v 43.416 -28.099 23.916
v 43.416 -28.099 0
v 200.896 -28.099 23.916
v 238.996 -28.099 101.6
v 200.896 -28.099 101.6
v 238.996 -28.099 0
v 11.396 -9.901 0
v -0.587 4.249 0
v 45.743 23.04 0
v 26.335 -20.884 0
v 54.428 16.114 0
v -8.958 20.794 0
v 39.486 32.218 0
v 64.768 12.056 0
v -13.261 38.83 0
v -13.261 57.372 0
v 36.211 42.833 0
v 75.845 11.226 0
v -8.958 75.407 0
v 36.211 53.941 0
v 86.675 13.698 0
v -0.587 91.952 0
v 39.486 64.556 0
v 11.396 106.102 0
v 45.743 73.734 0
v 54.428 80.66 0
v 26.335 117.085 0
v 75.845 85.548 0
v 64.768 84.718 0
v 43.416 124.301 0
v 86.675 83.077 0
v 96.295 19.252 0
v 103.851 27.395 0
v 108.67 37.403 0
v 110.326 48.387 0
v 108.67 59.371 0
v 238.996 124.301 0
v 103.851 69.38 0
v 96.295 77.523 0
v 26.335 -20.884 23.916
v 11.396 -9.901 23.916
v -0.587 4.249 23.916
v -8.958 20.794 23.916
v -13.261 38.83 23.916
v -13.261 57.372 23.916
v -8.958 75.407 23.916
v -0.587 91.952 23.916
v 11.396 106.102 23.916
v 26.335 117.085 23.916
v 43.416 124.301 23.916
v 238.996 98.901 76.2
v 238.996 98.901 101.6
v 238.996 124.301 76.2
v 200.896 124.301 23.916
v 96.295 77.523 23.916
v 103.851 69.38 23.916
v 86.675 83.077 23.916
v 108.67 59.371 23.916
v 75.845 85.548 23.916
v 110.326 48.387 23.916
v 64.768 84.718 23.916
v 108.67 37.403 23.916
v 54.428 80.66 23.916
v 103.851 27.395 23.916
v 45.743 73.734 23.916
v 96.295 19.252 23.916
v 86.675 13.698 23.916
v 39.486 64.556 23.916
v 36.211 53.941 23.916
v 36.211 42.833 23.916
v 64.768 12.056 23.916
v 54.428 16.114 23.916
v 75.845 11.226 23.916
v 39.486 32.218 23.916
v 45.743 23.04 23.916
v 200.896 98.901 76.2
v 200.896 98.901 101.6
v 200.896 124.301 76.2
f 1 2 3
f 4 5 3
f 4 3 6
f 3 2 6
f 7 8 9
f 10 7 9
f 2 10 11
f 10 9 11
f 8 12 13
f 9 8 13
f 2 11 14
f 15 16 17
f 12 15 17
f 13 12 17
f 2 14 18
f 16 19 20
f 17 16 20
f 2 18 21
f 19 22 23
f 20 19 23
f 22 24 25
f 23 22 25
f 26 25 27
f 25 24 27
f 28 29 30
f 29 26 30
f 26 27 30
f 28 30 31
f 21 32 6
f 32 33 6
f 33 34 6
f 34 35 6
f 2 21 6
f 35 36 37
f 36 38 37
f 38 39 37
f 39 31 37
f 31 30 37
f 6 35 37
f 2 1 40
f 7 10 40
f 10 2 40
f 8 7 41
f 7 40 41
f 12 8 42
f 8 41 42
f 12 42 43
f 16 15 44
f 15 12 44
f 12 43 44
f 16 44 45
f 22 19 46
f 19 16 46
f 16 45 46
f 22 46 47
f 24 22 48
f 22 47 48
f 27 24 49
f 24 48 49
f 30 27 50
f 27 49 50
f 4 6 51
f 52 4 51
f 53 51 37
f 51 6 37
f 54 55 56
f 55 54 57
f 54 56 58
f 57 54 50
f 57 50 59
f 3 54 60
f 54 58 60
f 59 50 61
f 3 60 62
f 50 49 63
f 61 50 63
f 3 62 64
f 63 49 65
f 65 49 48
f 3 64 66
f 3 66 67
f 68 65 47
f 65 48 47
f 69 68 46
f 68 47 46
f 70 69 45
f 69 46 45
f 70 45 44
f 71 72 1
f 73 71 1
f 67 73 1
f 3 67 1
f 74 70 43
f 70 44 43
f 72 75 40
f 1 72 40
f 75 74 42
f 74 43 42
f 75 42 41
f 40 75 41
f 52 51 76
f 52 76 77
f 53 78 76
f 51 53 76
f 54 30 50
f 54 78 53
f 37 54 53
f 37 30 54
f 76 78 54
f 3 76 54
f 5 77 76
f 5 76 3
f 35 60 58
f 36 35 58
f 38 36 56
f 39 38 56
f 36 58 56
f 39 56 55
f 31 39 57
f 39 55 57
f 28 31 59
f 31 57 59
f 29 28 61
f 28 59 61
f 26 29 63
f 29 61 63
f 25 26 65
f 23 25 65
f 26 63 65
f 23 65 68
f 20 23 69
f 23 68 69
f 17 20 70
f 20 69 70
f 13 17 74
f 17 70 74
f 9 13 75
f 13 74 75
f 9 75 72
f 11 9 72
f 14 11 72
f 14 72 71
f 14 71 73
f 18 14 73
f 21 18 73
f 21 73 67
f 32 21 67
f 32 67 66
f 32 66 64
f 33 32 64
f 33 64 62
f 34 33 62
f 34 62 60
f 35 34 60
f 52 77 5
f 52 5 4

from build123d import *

# Parameters (mm, degrees)
F0_W     = 254
F0_H     = 152.4
F1_DEPTH = 101.6
F2_W     = 152.4
F2_H     = 77.6838691145
F3_DEPTH = 215.9
F4_W     = 25.4
F4_H     = 25.4
F5_DEPTH = 50.8
F8_DEPTH = 25.4
F6_R     = 37.2654170077
F9_DEPTH = 25.4


with BuildPart() as f1:
    # F0 (on Top) → F1 (new body)
    with BuildSketch(Plane.XY):
        with Locations((111.9955861747, 48.1005767256)):
            Rectangle(F0_W, F0_H)
    extrude(amount=F1_DEPTH)

    # F2 (on face) → F3 (cut)
    with BuildSketch(Plane(origin=(-15.0044138253, 0, 0), x_dir=(0, -1, 0), z_dir=(-1, 0, 0))):
        with Locations((-48.1005767256, 62.7580654427)):
            Rectangle(F2_W, F2_H)
    extrude(amount=-F3_DEPTH, mode=Mode.SUBTRACT)

    # F4 (on face) → F5 (cut)
    with BuildSketch(Plane(origin=(200.8955861747, 0, 0), x_dir=(0, -1, 0), z_dir=(-1, 0, 0))):
        with Locations((-111.6005767256, 88.9)):
            Rectangle(F4_W, F4_H)
    extrude(amount=-F5_DEPTH, mode=Mode.SUBTRACT)

    # F7 (on face) → F8 (cut)
    with BuildSketch(Plane.XY.offset(23.9161308855)):
        with BuildLine():
            ThreePointArc((43.4155861747, -28.0994232744), (-13.8048519796, 48.1005767256), (43.4155861747, 124.3005767256))
            Line((43.4155861747, 124.3005767256), (-15.0044138253, 124.3005767256))
            Line((-15.0044138253, 124.3005767256), (-15.0044138253, -28.0994232744))
            Line((-15.0044138253, -28.0994232744), (43.4155861747, -28.0994232744))
        make_face()
    extrude(amount=-F8_DEPTH, mode=Mode.SUBTRACT)

    # F6 (on face) → F9 (cut)
    with BuildSketch(Plane.XY.offset(23.9161308855)):
        with Locations((73.0605365211, 48.3872703384)):
            Circle(F6_R)
    extrude(amount=-F9_DEPTH, mode=Mode.SUBTRACT)


solid = f1.part
